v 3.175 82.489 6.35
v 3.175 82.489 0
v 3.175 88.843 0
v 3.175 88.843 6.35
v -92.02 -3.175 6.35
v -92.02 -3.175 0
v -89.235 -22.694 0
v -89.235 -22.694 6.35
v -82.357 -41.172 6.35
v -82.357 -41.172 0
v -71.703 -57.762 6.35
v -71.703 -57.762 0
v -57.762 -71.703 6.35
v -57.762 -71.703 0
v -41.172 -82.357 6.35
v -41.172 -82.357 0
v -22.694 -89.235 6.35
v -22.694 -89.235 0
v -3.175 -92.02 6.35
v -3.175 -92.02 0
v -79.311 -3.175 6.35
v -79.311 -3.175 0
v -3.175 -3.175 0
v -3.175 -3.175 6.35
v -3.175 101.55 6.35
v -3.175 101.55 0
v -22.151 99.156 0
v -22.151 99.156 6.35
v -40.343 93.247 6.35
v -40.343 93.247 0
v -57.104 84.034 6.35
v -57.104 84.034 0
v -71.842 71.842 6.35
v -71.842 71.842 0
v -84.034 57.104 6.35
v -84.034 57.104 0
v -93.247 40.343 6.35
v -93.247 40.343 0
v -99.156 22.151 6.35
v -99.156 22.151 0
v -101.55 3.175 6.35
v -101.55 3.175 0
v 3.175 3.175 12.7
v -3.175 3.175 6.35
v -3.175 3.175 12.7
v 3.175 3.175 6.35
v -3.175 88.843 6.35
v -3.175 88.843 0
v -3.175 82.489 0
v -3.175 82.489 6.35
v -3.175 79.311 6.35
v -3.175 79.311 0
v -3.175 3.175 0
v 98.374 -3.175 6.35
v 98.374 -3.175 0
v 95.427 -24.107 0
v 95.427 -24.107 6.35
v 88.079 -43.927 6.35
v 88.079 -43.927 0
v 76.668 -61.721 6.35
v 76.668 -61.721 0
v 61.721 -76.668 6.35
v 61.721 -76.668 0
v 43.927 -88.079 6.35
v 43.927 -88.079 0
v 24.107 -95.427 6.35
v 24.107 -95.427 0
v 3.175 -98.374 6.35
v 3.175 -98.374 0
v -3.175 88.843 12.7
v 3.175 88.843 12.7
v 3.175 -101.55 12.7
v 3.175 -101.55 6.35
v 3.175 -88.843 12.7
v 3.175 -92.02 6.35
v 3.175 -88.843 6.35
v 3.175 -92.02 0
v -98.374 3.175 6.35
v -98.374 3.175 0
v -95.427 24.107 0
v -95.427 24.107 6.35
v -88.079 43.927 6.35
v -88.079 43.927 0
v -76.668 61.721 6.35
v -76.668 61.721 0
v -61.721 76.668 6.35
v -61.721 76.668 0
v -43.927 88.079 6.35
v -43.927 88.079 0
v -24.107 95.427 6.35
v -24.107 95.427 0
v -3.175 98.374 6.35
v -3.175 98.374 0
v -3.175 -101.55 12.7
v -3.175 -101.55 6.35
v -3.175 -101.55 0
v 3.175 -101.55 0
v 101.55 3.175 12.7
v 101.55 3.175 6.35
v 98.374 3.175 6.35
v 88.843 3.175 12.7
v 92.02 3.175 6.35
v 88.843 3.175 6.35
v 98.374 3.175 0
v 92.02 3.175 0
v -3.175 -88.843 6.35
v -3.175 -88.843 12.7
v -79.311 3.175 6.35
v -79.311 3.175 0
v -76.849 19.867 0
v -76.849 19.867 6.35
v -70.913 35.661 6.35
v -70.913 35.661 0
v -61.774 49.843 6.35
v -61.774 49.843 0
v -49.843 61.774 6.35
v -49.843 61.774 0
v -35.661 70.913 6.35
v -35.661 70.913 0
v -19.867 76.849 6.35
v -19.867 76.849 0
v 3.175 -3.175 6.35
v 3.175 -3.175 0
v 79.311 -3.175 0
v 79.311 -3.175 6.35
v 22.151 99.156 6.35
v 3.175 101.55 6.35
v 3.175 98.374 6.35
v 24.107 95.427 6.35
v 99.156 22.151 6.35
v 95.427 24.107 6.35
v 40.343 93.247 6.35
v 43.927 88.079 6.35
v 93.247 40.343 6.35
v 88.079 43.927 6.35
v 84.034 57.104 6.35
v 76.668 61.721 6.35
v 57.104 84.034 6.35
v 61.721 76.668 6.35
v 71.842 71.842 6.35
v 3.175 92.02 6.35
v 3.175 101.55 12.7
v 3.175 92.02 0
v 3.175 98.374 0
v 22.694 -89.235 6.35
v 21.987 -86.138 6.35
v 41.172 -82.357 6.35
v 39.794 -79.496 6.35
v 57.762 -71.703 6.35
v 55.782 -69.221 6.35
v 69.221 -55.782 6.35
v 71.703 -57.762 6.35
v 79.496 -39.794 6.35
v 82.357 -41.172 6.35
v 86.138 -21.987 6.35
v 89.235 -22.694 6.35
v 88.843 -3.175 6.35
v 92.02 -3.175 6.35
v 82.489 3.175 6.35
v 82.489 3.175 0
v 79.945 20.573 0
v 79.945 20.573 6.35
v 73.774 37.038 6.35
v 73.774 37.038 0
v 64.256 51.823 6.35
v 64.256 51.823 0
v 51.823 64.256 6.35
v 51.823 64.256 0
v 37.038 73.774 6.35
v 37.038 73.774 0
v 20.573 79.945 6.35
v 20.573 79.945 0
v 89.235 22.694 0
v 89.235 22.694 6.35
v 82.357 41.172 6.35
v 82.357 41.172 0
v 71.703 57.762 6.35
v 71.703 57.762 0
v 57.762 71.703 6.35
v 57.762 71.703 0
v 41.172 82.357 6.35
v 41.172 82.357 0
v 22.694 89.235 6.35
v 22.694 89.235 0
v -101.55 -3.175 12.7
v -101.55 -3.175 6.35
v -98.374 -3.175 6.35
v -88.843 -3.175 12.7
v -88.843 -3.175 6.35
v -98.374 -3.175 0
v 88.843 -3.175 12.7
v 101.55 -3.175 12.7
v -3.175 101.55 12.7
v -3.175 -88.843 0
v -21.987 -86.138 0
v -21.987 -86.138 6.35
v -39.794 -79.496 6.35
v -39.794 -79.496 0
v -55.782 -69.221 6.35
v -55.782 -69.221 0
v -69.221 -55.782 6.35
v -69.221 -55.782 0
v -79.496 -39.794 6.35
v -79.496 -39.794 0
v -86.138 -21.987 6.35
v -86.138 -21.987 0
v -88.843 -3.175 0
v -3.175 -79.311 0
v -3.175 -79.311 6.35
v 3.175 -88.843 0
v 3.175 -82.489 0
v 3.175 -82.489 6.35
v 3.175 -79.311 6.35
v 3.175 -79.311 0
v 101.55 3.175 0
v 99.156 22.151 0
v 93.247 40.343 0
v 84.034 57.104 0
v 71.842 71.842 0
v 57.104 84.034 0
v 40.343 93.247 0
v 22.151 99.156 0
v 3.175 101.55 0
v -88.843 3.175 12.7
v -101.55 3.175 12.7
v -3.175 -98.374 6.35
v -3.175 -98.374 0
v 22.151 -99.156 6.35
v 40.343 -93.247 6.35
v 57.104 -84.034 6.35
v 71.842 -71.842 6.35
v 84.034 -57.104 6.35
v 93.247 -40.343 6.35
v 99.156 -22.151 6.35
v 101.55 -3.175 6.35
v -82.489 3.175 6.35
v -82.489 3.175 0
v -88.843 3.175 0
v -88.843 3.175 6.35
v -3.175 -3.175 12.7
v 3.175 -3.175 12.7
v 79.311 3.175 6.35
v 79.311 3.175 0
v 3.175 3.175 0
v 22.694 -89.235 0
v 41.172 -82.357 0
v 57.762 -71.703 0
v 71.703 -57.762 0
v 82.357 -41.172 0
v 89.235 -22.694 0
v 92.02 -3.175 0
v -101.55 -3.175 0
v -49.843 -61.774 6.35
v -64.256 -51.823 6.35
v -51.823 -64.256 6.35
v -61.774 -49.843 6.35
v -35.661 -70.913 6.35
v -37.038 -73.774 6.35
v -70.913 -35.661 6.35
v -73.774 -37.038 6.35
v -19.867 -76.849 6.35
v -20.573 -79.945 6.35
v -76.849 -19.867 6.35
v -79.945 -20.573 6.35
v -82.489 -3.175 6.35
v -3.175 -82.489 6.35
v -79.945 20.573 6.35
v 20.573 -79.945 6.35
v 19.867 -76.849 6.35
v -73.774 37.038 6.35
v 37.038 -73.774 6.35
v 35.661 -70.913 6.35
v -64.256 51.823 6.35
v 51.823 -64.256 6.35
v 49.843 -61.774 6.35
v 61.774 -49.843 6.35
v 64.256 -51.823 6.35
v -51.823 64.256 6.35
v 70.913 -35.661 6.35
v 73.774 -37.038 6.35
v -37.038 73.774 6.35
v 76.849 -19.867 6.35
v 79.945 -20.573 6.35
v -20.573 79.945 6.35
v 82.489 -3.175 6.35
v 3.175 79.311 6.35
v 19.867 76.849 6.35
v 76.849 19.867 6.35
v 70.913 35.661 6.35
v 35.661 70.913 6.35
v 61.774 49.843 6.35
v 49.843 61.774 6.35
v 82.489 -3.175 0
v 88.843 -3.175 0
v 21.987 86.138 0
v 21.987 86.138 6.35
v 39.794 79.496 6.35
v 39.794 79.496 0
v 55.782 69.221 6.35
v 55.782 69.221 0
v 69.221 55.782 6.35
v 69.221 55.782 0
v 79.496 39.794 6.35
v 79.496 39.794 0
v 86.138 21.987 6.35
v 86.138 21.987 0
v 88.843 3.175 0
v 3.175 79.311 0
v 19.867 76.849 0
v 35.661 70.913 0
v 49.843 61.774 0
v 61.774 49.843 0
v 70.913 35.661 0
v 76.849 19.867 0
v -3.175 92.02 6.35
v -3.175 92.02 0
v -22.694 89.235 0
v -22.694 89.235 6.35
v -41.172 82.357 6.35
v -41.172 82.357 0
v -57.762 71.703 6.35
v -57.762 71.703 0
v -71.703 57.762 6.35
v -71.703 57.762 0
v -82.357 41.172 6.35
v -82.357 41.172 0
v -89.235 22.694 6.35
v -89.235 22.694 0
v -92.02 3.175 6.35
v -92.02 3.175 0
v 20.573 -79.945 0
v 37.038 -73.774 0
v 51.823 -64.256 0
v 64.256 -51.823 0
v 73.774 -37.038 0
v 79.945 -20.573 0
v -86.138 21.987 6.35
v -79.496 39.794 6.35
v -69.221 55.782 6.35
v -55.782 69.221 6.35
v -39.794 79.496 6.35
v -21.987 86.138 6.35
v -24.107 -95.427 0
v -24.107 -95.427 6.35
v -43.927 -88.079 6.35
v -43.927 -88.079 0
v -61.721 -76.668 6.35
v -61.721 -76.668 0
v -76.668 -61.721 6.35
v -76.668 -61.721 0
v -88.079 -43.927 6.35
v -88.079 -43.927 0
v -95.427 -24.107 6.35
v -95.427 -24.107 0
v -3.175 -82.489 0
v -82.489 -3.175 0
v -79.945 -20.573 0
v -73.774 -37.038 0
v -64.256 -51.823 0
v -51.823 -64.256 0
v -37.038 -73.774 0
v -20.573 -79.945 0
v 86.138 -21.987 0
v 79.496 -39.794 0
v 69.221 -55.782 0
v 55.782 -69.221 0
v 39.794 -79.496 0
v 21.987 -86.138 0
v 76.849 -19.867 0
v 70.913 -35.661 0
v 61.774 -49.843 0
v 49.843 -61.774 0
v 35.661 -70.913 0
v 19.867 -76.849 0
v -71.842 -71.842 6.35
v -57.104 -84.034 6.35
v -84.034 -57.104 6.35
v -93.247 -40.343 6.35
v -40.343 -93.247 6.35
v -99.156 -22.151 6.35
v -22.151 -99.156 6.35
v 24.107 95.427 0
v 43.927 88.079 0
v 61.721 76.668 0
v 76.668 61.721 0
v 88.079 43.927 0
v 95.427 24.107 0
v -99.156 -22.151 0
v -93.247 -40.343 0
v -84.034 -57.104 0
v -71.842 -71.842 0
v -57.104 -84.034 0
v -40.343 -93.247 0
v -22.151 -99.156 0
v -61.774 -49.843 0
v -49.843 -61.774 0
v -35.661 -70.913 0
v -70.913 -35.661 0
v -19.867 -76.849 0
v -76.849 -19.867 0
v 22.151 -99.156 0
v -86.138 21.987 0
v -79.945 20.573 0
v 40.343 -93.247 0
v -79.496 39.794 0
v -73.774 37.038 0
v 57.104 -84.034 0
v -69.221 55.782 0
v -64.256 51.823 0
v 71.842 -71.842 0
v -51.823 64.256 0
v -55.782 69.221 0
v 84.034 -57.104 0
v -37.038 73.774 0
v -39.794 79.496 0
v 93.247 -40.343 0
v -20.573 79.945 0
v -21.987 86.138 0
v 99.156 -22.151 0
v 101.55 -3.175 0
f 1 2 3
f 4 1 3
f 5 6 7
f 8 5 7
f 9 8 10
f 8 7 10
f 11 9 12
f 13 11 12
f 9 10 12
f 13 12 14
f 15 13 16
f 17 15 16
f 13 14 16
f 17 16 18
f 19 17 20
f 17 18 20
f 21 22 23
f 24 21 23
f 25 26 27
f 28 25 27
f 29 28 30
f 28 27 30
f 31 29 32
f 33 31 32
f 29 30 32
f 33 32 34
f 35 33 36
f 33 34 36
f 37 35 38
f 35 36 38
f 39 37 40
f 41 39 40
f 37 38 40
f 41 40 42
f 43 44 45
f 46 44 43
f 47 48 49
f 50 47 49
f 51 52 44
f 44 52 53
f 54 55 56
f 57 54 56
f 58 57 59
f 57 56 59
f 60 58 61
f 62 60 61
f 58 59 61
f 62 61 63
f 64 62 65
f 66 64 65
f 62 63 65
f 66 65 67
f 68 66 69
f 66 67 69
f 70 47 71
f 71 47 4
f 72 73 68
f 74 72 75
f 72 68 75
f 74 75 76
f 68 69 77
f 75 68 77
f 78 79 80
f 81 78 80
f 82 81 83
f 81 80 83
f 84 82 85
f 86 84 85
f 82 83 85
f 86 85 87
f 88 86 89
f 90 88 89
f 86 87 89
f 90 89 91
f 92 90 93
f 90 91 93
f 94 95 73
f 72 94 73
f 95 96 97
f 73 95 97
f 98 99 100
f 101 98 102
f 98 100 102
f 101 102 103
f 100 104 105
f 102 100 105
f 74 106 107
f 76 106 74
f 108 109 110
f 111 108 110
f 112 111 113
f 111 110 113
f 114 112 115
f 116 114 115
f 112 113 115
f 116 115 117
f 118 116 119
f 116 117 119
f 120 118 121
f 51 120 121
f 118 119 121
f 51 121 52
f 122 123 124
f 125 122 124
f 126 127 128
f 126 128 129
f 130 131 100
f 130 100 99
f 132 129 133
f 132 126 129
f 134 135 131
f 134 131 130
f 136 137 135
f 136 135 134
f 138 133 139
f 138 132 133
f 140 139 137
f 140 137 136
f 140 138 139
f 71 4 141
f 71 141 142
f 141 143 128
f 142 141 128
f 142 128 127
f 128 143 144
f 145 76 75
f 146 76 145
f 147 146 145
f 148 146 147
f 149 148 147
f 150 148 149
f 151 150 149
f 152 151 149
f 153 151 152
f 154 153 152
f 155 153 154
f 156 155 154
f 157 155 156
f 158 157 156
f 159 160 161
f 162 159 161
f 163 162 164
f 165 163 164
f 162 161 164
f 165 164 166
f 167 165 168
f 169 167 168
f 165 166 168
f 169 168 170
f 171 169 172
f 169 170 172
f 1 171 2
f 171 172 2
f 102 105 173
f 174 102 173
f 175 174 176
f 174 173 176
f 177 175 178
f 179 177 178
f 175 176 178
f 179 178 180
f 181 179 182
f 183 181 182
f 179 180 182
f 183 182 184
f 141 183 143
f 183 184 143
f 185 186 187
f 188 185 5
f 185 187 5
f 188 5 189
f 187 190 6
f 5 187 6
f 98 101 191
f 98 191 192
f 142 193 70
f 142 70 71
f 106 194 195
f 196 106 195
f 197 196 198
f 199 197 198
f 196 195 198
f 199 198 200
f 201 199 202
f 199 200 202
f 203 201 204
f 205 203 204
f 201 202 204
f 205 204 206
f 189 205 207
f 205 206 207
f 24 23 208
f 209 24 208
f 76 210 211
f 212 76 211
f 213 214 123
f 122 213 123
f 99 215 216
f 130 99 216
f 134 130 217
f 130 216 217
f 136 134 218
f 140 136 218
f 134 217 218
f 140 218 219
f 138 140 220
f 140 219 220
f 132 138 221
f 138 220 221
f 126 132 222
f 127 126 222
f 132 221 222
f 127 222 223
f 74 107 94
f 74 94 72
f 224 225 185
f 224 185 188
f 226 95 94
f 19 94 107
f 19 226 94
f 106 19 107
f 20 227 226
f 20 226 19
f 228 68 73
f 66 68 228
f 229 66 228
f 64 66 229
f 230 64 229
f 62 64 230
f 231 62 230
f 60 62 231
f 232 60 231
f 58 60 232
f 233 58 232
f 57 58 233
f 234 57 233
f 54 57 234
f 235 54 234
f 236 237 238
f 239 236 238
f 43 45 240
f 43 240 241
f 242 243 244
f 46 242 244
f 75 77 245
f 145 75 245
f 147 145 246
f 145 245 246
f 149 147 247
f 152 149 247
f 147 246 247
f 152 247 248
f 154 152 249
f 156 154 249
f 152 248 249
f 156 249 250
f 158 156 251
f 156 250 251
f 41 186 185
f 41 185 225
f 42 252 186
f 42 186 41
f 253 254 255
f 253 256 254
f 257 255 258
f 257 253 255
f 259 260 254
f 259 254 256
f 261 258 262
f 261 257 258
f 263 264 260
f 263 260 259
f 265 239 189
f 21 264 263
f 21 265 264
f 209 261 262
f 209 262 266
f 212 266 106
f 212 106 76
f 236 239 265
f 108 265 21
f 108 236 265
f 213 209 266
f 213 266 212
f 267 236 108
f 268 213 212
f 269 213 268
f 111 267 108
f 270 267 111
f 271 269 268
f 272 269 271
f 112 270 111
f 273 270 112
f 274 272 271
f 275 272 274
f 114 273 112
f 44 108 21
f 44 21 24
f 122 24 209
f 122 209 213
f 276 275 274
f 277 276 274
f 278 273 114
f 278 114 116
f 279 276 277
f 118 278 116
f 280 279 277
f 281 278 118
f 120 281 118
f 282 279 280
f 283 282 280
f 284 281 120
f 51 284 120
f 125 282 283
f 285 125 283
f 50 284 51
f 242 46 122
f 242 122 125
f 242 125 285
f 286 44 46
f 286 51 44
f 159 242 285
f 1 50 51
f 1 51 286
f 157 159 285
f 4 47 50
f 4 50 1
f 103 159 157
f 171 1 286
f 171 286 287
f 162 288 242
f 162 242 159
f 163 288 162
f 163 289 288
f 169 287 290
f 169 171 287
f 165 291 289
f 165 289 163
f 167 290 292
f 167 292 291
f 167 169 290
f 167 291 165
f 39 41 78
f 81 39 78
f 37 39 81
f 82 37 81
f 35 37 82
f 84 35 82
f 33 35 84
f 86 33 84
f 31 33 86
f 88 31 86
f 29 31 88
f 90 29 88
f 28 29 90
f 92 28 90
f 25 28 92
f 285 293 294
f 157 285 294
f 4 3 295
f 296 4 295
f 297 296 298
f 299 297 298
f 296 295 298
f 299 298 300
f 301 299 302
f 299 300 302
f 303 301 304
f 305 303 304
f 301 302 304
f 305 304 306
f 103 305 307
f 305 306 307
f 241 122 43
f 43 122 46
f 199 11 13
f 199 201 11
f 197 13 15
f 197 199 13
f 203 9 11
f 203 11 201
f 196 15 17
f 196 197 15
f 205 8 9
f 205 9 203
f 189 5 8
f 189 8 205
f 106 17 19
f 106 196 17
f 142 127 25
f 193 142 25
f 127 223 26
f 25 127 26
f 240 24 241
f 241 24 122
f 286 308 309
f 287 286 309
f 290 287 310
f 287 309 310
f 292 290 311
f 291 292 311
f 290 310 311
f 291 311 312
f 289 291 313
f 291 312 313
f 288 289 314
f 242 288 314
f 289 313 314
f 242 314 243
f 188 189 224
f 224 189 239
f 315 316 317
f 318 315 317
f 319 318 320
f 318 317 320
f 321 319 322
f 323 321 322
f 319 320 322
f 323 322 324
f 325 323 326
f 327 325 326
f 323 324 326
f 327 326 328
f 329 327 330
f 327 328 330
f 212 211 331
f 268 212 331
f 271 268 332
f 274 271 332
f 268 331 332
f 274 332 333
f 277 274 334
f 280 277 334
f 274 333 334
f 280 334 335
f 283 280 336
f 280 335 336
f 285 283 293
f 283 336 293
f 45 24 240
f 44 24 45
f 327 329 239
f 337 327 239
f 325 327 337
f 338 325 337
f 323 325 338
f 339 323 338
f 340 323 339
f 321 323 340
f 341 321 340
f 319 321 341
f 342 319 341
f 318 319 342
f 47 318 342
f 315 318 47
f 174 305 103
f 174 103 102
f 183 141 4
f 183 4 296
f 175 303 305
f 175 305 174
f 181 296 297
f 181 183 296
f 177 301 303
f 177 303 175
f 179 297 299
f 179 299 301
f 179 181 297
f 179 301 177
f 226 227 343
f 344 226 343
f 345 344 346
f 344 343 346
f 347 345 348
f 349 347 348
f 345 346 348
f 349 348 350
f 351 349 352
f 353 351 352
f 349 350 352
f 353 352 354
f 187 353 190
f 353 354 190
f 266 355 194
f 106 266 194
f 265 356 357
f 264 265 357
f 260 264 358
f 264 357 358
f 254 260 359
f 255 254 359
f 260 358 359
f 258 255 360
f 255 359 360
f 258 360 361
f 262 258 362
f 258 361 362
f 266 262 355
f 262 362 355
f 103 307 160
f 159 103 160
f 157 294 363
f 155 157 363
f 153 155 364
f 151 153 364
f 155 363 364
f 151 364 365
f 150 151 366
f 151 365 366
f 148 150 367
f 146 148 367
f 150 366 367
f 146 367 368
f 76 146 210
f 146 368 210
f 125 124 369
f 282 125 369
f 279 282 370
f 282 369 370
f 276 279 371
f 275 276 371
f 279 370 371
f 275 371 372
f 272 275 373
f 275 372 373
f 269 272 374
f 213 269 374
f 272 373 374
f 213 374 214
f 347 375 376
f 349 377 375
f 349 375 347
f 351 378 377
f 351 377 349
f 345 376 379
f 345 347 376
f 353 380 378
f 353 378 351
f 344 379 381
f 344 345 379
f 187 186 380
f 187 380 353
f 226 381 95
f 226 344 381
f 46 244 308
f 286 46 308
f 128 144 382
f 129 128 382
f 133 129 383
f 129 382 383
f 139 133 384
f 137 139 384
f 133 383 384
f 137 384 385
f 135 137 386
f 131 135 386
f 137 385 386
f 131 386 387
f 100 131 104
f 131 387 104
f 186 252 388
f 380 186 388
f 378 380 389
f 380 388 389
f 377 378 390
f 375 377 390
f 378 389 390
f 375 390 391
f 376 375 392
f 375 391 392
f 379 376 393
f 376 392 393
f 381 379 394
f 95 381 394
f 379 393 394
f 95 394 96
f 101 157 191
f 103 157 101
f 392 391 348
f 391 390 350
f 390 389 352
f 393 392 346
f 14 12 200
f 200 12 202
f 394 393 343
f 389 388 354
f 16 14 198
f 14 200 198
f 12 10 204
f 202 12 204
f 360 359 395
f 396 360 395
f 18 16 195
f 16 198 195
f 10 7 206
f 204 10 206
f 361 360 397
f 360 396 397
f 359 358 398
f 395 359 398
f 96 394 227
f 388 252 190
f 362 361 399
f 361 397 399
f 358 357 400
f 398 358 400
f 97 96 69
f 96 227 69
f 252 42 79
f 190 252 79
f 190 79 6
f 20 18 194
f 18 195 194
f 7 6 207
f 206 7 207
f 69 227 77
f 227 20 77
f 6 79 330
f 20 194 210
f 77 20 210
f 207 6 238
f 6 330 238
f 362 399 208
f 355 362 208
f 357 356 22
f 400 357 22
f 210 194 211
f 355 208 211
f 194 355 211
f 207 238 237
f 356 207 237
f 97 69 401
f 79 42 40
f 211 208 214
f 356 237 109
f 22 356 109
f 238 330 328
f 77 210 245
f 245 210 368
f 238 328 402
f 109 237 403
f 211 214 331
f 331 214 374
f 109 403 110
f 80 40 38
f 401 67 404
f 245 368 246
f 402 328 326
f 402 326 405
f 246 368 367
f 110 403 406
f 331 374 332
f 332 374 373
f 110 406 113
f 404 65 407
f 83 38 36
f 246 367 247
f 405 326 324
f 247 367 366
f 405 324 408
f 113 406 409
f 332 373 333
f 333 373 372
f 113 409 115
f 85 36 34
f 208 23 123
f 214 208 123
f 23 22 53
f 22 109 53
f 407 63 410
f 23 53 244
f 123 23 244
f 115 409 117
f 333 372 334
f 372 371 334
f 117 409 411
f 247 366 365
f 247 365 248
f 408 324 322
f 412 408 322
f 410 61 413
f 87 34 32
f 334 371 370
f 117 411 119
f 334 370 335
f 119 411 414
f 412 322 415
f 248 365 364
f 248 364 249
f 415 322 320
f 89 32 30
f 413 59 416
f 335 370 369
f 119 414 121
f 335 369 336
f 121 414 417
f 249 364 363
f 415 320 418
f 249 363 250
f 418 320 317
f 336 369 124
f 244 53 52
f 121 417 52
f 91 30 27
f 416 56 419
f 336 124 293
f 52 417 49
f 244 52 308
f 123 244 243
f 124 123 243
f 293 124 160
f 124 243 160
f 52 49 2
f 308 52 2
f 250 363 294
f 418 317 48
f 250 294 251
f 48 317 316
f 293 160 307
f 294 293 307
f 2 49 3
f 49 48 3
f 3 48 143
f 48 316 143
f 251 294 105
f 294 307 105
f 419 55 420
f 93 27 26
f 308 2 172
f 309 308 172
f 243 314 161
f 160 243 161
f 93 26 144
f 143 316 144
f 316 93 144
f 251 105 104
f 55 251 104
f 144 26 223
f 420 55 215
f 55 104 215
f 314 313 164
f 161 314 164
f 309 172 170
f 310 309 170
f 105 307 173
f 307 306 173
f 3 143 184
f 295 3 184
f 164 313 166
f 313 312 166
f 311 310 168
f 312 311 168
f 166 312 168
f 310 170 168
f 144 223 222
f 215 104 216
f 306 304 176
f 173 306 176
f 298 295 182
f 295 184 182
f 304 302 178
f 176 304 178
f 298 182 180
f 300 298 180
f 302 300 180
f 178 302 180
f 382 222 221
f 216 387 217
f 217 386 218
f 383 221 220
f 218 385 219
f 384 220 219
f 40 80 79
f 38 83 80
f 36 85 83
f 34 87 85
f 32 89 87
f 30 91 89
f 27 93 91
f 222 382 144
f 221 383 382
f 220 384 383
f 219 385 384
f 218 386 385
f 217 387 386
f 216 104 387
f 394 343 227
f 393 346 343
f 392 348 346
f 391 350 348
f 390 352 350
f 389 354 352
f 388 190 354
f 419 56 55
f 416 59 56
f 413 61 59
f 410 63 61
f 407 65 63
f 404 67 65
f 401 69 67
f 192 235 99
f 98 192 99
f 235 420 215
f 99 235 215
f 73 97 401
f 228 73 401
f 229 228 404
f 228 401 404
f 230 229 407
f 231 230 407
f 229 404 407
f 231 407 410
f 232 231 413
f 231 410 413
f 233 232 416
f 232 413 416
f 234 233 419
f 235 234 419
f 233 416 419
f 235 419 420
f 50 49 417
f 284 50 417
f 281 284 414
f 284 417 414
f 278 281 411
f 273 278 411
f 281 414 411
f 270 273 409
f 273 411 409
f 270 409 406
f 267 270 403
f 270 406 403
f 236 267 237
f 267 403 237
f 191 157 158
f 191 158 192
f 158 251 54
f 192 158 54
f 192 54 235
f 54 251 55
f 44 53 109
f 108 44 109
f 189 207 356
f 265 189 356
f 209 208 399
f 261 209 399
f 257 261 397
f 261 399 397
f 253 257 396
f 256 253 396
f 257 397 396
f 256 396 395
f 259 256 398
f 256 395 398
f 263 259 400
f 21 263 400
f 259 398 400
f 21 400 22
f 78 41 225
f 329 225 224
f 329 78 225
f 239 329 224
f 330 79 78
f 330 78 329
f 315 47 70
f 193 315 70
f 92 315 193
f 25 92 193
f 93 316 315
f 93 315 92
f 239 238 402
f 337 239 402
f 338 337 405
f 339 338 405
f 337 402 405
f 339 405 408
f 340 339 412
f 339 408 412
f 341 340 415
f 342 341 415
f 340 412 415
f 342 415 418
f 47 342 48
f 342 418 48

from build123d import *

# Parameters (mm, degrees)
F0_W     = 6.35
F0_H     = 6.35
F1_DEPTH = 6.35
F2_W     = 12.7070930267
F2_H     = 6.35
F2_W_2   = 6.35
F2_H_2   = 12.7070930267
F3_DEPTH = 6.35


with BuildPart() as f1:
    # F0 (on Top) → F1 (new body)
    with BuildSketch(Plane.XY):
        with BuildLine():
            ThreePointArc((-101.5503785074, -3.175), (-71.8420489686, -71.8420489686), (-3.175, -101.5503785074))
            Line((-3.175, -101.5503785074), (-3.175, -98.3737769937))
            ThreePointArc((-3.175, -98.3737769937), (-69.5969849383, -69.5969849383), (-98.3737769937, -3.175))
            Line((-98.3737769937, -3.175), (-101.5503785074, -3.175))
        make_face()
        with BuildLine():
            Line((-3.175, 98.3737769937), (-3.175, 101.5503785074))
            ThreePointArc((-3.175, 101.5503785074), (-71.8420489686, 71.8420489686), (-101.5503785074, 3.175))
            Line((-101.5503785074, 3.175), (-98.3737769937, 3.175))
            ThreePointArc((-98.3737769937, 3.175), (-69.5969849383, 69.5969849383), (-3.175, 98.3737769937))
        make_face()
        with BuildLine():
            Line((-98.3737769937, 3.175), (-101.5503785074, 3.175))
            Line((-101.5503785074, 3.175), (-101.5503785074, -3.175))
            Line((-101.5503785074, -3.175), (-98.3737769937, -3.175))
            ThreePointArc((-98.3737769937, -3.175), (-98.425, 0), (-98.3737769937, 3.175))
        make_face()
        with BuildLine():
            Line((-92.0202423383, 3.175), (-98.3737769937, 3.175))
            ThreePointArc((-98.3737769937, 3.175), (-98.425, 0), (-98.3737769937, -3.175))
            Line((-98.3737769937, -3.175), (-92.0202423383, -3.175))
            ThreePointArc((-92.0202423383, -3.175), (-92.075, 0), (-92.0202423383, 3.175))
        make_face()
        with BuildLine():
            Line((-88.8432854807, 3.175), (-92.0202423383, 3.175))
            ThreePointArc((-92.0202423383, 3.175), (-92.075, 0), (-92.0202423383, -3.175))
            Line((-92.0202423383, -3.175), (-88.8432854807, -3.175))
            ThreePointArc((-88.8432854807, -3.175), (-88.9, 0), (-88.8432854807, 3.175))
        make_face()
        with BuildLine():
            Line((-79.3114745797, 3.175), (-82.4889197105, 3.175))
            ThreePointArc((-82.4889197105, 3.175), (-82.55, 0), (-82.4889197105, -3.175))
            Line((-82.4889197105, -3.175), (-79.3114745797, -3.175))
            ThreePointArc((-79.3114745797, -3.175), (-79.375, 0), (-79.3114745797, 3.175))
        make_face()
        with BuildLine():
            Line((-82.4889197105, 3.175), (-88.8432854807, 3.175))
            ThreePointArc((-88.8432854807, 3.175), (-88.9, 0), (-88.8432854807, -3.175))
            Line((-88.8432854807, -3.175), (-82.4889197105, -3.175))
            ThreePointArc((-82.4889197105, -3.175), (-82.55, 0), (-82.4889197105, 3.175))
        make_face()
        with BuildLine():
            Line((-3.175, -3.175), (-3.175, 3.175))
            Line((-3.175, 3.175), (-79.3114745797, 3.175))
            ThreePointArc((-79.3114745797, 3.175), (-79.375, 0), (-79.3114745797, -3.175))
            Line((-79.3114745797, -3.175), (-3.175, -3.175))
        make_face()
        with BuildLine():
            ThreePointArc((79.375, 0), (79.3591170558, 1.5878177225), (79.3114745797, 3.175))
            Line((79.3114745797, 3.175), (3.175, 3.175))
            Line((3.175, 3.175), (3.175, -3.175))
            Line((3.175, -3.175), (79.3114745797, -3.175))
            ThreePointArc((79.3114745797, -3.175), (79.3591170558, -1.5878177225), (79.375, 0))
        make_face()
        with BuildLine():
            ThreePointArc((-3.175, -79.3114745797), (0, -79.375), (3.175, -79.3114745797))
            Line((3.175, -79.3114745797), (3.175, -3.175))
            Line((3.175, -3.175), (-3.175, -3.175))
            Line((-3.175, -3.175), (-3.175, -79.3114745797))
        make_face()
        with BuildLine():
            Line((3.175, 3.175), (3.175, 79.3114745797))
            ThreePointArc((3.175, 79.3114745797), (0, 79.375), (-3.175, 79.3114745797))
            Line((-3.175, 79.3114745797), (-3.175, 3.175))
            Line((-3.175, 3.175), (3.175, 3.175))
        make_face()
        Rectangle(F0_W, F0_H)
        with BuildLine():
            ThreePointArc((82.55, 0), (82.534728515, 1.5877937367), (82.4889197105, 3.175))
            Line((82.4889197105, 3.175), (79.3114745797, 3.175))
            ThreePointArc((79.3114745797, 3.175), (79.3591170558, 1.5878177225), (79.375, 0))
            ThreePointArc((79.375, 0), (79.3591170558, -1.5878177225), (79.3114745797, -3.175))
            Line((79.3114745797, -3.175), (82.4889197105, -3.175))
            ThreePointArc((82.4889197105, -3.175), (82.534728515, -1.5877937367), (82.55, 0))
        make_face()
        with BuildLine():
            ThreePointArc((88.9, 0), (88.8858202393, 1.5877532504), (88.8432854807, 3.175))
            Line((88.8432854807, 3.175), (82.4889197105, 3.175))
            ThreePointArc((82.4889197105, 3.175), (82.534728515, 1.5877937367), (82.55, 0))
            ThreePointArc((82.55, 0), (82.534728515, -1.5877937367), (82.4889197105, -3.175))
            Line((82.4889197105, -3.175), (88.8432854807, -3.175))
            ThreePointArc((88.8432854807, -3.175), (88.8858202393, -1.5877532504), (88.9, 0))
        make_face()
        with BuildLine():
            ThreePointArc((92.075, 0), (92.0613095668, 1.5877360771), (92.0202423383, 3.175))
            Line((92.0202423383, 3.175), (88.8432854807, 3.175))
            ThreePointArc((88.8432854807, 3.175), (88.8858202393, 1.5877532504), (88.9, 0))
            ThreePointArc((88.9, 0), (88.8858202393, -1.5877532504), (88.8432854807, -3.175))
            Line((88.8432854807, -3.175), (92.0202423383, -3.175))
            ThreePointArc((92.0202423383, -3.175), (92.0613095668, -1.5877360771), (92.075, 0))
        make_face()
        with BuildLine():
            ThreePointArc((98.425, 0), (98.4121934153, 1.5877065847), (98.3737769937, 3.175))
            Line((98.3737769937, 3.175), (92.0202423383, 3.175))
            ThreePointArc((92.0202423383, 3.175), (92.0613095668, 1.5877360771), (92.075, 0))
            ThreePointArc((92.075, 0), (92.0613095668, -1.5877360771), (92.0202423383, -3.175))
            Line((92.0202423383, -3.175), (98.3737769937, -3.175))
            ThreePointArc((98.3737769937, -3.175), (98.4121934153, -1.5877065847), (98.425, 0))
        make_face()
        with BuildLine():
            Line((101.5503785074, -3.175), (101.5503785074, 3.175))
            Line((101.5503785074, 3.175), (98.3737769937, 3.175))
            ThreePointArc((98.3737769937, 3.175), (98.4121934153, 1.5877065847), (98.425, 0))
            ThreePointArc((98.425, 0), (98.4121934153, -1.5877065847), (98.3737769937, -3.175))
            Line((98.3737769937, -3.175), (101.5503785074, -3.175))
        make_face()
        with BuildLine():
            Line((-3.175, -101.5503785074), (3.175, -101.5503785074))
            Line((3.175, -101.5503785074), (3.175, -98.3737769937))
            ThreePointArc((3.175, -98.3737769937), (0, -98.425), (-3.175, -98.3737769937))
            Line((-3.175, -98.3737769937), (-3.175, -101.5503785074))
        make_face()
        with BuildLine():
            ThreePointArc((-3.175, -92.0202423383), (0, -92.075), (3.175, -92.0202423383))
            Line((3.175, -92.0202423383), (3.175, -88.8432854807))
            ThreePointArc((3.175, -88.8432854807), (0, -88.9), (-3.175, -88.8432854807))
            Line((-3.175, -88.8432854807), (-3.175, -92.0202423383))
        make_face()
        with BuildLine():
            ThreePointArc((-3.175, -82.4889197105), (0, -82.55), (3.175, -82.4889197105))
            Line((3.175, -82.4889197105), (3.175, -79.3114745797))
            ThreePointArc((3.175, -79.3114745797), (0, -79.375), (-3.175, -79.3114745797))
            Line((-3.175, -79.3114745797), (-3.175, -82.4889197105))
        make_face()
        with BuildLine():
            ThreePointArc((3.175, -101.5503785074), (71.8420489686, -71.8420489686), (101.5503785074, -3.175))
            Line((101.5503785074, -3.175), (98.3737769937, -3.175))
            ThreePointArc((98.3737769937, -3.175), (69.5969849383, -69.5969849383), (3.175, -98.3737769937))
            Line((3.175, -98.3737769937), (3.175, -101.5503785074))
        make_face()
        with BuildLine():
            ThreePointArc((3.175, -92.0202423383), (65.1068568778, -65.1068568778), (92.0202423383, -3.175))
            Line((92.0202423383, -3.175), (88.8432854807, -3.175))
            ThreePointArc((88.8432854807, -3.175), (62.8617928475, -62.8617928475), (3.175, -88.8432854807))
            Line((3.175, -88.8432854807), (3.175, -92.0202423383))
        make_face()
        with BuildLine():
            ThreePointArc((3.175, -82.4889197105), (58.3716647869, -58.3716647869), (82.4889197105, -3.175))
            Line((82.4889197105, -3.175), (79.3114745797, -3.175))
            ThreePointArc((79.3114745797, -3.175), (56.1266007567, -56.1266007567), (3.175, -79.3114745797))
            Line((3.175, -79.3114745797), (3.175, -82.4889197105))
        make_face()
        with BuildLine():
            ThreePointArc((-92.0202423383, -3.175), (-65.1068568778, -65.1068568778), (-3.175, -92.0202423383))
            Line((-3.175, -92.0202423383), (-3.175, -88.8432854807))
            ThreePointArc((-3.175, -88.8432854807), (-62.8617928475, -62.8617928475), (-88.8432854807, -3.175))
            Line((-88.8432854807, -3.175), (-92.0202423383, -3.175))
        make_face()
        with BuildLine():
            ThreePointArc((-82.4889197105, -3.175), (-58.371664787, -58.3716647869), (-3.175, -82.4889197105))
            Line((-3.175, -82.4889197105), (-3.175, -79.3114745797))
            ThreePointArc((-3.175, -79.3114745797), (-56.1266007567, -56.1266007567), (-79.3114745797, -3.175))
            Line((-79.3114745797, -3.175), (-82.4889197105, -3.175))
        make_face()
        with BuildLine():
            Line((-3.175, 79.3114745797), (-3.175, 82.4889197105))
            ThreePointArc((-3.175, 82.4889197105), (-58.371664787, 58.3716647869), (-82.4889197105, 3.175))
            Line((-82.4889197105, 3.175), (-79.3114745797, 3.175))
            ThreePointArc((-79.3114745797, 3.175), (-56.1266007567, 56.1266007567), (-3.175, 79.3114745797))
        make_face()
        with BuildLine():
            Line((-3.175, 88.8432854807), (-3.175, 92.0202423383))
            ThreePointArc((-3.175, 92.0202423383), (-65.1068568778, 65.1068568778), (-92.0202423383, 3.175))
            Line((-92.0202423383, 3.175), (-88.8432854807, 3.175))
            ThreePointArc((-88.8432854807, 3.175), (-62.8617928475, 62.8617928475), (-3.175, 88.8432854807))
        make_face()
        with BuildLine():
            Line((3.175, 79.3114745797), (3.175, 82.4889197105))
            ThreePointArc((3.175, 82.4889197105), (0, 82.55), (-3.175, 82.4889197105))
            Line((-3.175, 82.4889197105), (-3.175, 79.3114745797))
            ThreePointArc((-3.175, 79.3114745797), (0, 79.375), (3.175, 79.3114745797))
        make_face()
        with BuildLine():
            Line((3.175, 88.8432854807), (3.175, 92.0202423383))
            ThreePointArc((3.175, 92.0202423383), (0, 92.075), (-3.175, 92.0202423383))
            Line((-3.175, 92.0202423383), (-3.175, 88.8432854807))
            ThreePointArc((-3.175, 88.8432854807), (0, 88.9), (3.175, 88.8432854807))
        make_face()
        with BuildLine():
            Line((3.175, 98.3737769937), (3.175, 101.5503785074))
            Line((3.175, 101.5503785074), (-3.175, 101.5503785074))
            Line((-3.175, 101.5503785074), (-3.175, 98.3737769937))
            ThreePointArc((-3.175, 98.3737769937), (0, 98.425), (3.175, 98.3737769937))
        make_face()
        with BuildLine():
            Line((98.3737769937, 3.175), (101.5503785074, 3.175))
            ThreePointArc((101.5503785074, 3.175), (71.8420489686, 71.8420489686), (3.175, 101.5503785074))
            Line((3.175, 101.5503785074), (3.175, 98.3737769937))
            ThreePointArc((3.175, 98.3737769937), (69.5969849383, 69.5969849383), (98.3737769937, 3.175))
        make_face()
        with BuildLine():
            Line((88.8432854807, 3.175), (92.0202423383, 3.175))
            ThreePointArc((92.0202423383, 3.175), (65.1068568778, 65.1068568778), (3.175, 92.0202423383))
            Line((3.175, 92.0202423383), (3.175, 88.8432854807))
            ThreePointArc((3.175, 88.8432854807), (62.8617928475, 62.8617928475), (88.8432854807, 3.175))
        make_face()
        with BuildLine():
            Line((79.3114745797, 3.175), (82.4889197105, 3.175))
            ThreePointArc((82.4889197105, 3.175), (58.3716647869, 58.3716647869), (3.175, 82.4889197105))
            Line((3.175, 82.4889197105), (3.175, 79.3114745797))
            ThreePointArc((3.175, 79.3114745797), (56.1266007567, 56.1266007567), (79.3114745797, 3.175))
        make_face()
        with BuildLine():
            ThreePointArc((-3.175, -88.8432854807), (0, -88.9), (3.175, -88.8432854807))
            Line((3.175, -88.8432854807), (3.175, -82.4889197105))
            ThreePointArc((3.175, -82.4889197105), (0, -82.55), (-3.175, -82.4889197105))
            Line((-3.175, -82.4889197105), (-3.175, -88.8432854807))
        make_face()
        with BuildLine():
            ThreePointArc((-3.175, -98.3737769937), (0, -98.425), (3.175, -98.3737769937))
            Line((3.175, -98.3737769937), (3.175, -92.0202423383))
            ThreePointArc((3.175, -92.0202423383), (0, -92.075), (-3.175, -92.0202423383))
            Line((-3.175, -92.0202423383), (-3.175, -98.3737769937))
        make_face()
        with BuildLine():
            Line((3.175, 82.4889197105), (3.175, 88.8432854807))
            ThreePointArc((3.175, 88.8432854807), (0, 88.9), (-3.175, 88.8432854807))
            Line((-3.175, 88.8432854807), (-3.175, 82.4889197105))
            ThreePointArc((-3.175, 82.4889197105), (0, 82.55), (3.175, 82.4889197105))
        make_face()
        with BuildLine():
            Line((3.175, 92.0202423383), (3.175, 98.3737769937))
            ThreePointArc((3.175, 98.3737769937), (0, 98.425), (-3.175, 98.3737769937))
            Line((-3.175, 98.3737769937), (-3.175, 92.0202423383))
            ThreePointArc((-3.175, 92.0202423383), (0, 92.075), (3.175, 92.0202423383))
        make_face()
    extrude(amount=F1_DEPTH)

    # F2 (on face) → F3 (join)
    with BuildSketch(Plane.XY.offset(6.35)):
        with Locations((-95.196831994, 0)):
            Rectangle(F2_W, F2_H)
        with Locations((95.196831994, 0)):
            Rectangle(F2_W, F2_H)
        with Locations((0, 95.196831994)):
            Rectangle(F2_W_2, F2_H_2)
        with Locations((0, -95.196831994)):
            Rectangle(F2_W_2, F2_H_2)
        Rectangle(F2_W_2, F2_H)
    extrude(amount=F3_DEPTH)


solid = f1.part
